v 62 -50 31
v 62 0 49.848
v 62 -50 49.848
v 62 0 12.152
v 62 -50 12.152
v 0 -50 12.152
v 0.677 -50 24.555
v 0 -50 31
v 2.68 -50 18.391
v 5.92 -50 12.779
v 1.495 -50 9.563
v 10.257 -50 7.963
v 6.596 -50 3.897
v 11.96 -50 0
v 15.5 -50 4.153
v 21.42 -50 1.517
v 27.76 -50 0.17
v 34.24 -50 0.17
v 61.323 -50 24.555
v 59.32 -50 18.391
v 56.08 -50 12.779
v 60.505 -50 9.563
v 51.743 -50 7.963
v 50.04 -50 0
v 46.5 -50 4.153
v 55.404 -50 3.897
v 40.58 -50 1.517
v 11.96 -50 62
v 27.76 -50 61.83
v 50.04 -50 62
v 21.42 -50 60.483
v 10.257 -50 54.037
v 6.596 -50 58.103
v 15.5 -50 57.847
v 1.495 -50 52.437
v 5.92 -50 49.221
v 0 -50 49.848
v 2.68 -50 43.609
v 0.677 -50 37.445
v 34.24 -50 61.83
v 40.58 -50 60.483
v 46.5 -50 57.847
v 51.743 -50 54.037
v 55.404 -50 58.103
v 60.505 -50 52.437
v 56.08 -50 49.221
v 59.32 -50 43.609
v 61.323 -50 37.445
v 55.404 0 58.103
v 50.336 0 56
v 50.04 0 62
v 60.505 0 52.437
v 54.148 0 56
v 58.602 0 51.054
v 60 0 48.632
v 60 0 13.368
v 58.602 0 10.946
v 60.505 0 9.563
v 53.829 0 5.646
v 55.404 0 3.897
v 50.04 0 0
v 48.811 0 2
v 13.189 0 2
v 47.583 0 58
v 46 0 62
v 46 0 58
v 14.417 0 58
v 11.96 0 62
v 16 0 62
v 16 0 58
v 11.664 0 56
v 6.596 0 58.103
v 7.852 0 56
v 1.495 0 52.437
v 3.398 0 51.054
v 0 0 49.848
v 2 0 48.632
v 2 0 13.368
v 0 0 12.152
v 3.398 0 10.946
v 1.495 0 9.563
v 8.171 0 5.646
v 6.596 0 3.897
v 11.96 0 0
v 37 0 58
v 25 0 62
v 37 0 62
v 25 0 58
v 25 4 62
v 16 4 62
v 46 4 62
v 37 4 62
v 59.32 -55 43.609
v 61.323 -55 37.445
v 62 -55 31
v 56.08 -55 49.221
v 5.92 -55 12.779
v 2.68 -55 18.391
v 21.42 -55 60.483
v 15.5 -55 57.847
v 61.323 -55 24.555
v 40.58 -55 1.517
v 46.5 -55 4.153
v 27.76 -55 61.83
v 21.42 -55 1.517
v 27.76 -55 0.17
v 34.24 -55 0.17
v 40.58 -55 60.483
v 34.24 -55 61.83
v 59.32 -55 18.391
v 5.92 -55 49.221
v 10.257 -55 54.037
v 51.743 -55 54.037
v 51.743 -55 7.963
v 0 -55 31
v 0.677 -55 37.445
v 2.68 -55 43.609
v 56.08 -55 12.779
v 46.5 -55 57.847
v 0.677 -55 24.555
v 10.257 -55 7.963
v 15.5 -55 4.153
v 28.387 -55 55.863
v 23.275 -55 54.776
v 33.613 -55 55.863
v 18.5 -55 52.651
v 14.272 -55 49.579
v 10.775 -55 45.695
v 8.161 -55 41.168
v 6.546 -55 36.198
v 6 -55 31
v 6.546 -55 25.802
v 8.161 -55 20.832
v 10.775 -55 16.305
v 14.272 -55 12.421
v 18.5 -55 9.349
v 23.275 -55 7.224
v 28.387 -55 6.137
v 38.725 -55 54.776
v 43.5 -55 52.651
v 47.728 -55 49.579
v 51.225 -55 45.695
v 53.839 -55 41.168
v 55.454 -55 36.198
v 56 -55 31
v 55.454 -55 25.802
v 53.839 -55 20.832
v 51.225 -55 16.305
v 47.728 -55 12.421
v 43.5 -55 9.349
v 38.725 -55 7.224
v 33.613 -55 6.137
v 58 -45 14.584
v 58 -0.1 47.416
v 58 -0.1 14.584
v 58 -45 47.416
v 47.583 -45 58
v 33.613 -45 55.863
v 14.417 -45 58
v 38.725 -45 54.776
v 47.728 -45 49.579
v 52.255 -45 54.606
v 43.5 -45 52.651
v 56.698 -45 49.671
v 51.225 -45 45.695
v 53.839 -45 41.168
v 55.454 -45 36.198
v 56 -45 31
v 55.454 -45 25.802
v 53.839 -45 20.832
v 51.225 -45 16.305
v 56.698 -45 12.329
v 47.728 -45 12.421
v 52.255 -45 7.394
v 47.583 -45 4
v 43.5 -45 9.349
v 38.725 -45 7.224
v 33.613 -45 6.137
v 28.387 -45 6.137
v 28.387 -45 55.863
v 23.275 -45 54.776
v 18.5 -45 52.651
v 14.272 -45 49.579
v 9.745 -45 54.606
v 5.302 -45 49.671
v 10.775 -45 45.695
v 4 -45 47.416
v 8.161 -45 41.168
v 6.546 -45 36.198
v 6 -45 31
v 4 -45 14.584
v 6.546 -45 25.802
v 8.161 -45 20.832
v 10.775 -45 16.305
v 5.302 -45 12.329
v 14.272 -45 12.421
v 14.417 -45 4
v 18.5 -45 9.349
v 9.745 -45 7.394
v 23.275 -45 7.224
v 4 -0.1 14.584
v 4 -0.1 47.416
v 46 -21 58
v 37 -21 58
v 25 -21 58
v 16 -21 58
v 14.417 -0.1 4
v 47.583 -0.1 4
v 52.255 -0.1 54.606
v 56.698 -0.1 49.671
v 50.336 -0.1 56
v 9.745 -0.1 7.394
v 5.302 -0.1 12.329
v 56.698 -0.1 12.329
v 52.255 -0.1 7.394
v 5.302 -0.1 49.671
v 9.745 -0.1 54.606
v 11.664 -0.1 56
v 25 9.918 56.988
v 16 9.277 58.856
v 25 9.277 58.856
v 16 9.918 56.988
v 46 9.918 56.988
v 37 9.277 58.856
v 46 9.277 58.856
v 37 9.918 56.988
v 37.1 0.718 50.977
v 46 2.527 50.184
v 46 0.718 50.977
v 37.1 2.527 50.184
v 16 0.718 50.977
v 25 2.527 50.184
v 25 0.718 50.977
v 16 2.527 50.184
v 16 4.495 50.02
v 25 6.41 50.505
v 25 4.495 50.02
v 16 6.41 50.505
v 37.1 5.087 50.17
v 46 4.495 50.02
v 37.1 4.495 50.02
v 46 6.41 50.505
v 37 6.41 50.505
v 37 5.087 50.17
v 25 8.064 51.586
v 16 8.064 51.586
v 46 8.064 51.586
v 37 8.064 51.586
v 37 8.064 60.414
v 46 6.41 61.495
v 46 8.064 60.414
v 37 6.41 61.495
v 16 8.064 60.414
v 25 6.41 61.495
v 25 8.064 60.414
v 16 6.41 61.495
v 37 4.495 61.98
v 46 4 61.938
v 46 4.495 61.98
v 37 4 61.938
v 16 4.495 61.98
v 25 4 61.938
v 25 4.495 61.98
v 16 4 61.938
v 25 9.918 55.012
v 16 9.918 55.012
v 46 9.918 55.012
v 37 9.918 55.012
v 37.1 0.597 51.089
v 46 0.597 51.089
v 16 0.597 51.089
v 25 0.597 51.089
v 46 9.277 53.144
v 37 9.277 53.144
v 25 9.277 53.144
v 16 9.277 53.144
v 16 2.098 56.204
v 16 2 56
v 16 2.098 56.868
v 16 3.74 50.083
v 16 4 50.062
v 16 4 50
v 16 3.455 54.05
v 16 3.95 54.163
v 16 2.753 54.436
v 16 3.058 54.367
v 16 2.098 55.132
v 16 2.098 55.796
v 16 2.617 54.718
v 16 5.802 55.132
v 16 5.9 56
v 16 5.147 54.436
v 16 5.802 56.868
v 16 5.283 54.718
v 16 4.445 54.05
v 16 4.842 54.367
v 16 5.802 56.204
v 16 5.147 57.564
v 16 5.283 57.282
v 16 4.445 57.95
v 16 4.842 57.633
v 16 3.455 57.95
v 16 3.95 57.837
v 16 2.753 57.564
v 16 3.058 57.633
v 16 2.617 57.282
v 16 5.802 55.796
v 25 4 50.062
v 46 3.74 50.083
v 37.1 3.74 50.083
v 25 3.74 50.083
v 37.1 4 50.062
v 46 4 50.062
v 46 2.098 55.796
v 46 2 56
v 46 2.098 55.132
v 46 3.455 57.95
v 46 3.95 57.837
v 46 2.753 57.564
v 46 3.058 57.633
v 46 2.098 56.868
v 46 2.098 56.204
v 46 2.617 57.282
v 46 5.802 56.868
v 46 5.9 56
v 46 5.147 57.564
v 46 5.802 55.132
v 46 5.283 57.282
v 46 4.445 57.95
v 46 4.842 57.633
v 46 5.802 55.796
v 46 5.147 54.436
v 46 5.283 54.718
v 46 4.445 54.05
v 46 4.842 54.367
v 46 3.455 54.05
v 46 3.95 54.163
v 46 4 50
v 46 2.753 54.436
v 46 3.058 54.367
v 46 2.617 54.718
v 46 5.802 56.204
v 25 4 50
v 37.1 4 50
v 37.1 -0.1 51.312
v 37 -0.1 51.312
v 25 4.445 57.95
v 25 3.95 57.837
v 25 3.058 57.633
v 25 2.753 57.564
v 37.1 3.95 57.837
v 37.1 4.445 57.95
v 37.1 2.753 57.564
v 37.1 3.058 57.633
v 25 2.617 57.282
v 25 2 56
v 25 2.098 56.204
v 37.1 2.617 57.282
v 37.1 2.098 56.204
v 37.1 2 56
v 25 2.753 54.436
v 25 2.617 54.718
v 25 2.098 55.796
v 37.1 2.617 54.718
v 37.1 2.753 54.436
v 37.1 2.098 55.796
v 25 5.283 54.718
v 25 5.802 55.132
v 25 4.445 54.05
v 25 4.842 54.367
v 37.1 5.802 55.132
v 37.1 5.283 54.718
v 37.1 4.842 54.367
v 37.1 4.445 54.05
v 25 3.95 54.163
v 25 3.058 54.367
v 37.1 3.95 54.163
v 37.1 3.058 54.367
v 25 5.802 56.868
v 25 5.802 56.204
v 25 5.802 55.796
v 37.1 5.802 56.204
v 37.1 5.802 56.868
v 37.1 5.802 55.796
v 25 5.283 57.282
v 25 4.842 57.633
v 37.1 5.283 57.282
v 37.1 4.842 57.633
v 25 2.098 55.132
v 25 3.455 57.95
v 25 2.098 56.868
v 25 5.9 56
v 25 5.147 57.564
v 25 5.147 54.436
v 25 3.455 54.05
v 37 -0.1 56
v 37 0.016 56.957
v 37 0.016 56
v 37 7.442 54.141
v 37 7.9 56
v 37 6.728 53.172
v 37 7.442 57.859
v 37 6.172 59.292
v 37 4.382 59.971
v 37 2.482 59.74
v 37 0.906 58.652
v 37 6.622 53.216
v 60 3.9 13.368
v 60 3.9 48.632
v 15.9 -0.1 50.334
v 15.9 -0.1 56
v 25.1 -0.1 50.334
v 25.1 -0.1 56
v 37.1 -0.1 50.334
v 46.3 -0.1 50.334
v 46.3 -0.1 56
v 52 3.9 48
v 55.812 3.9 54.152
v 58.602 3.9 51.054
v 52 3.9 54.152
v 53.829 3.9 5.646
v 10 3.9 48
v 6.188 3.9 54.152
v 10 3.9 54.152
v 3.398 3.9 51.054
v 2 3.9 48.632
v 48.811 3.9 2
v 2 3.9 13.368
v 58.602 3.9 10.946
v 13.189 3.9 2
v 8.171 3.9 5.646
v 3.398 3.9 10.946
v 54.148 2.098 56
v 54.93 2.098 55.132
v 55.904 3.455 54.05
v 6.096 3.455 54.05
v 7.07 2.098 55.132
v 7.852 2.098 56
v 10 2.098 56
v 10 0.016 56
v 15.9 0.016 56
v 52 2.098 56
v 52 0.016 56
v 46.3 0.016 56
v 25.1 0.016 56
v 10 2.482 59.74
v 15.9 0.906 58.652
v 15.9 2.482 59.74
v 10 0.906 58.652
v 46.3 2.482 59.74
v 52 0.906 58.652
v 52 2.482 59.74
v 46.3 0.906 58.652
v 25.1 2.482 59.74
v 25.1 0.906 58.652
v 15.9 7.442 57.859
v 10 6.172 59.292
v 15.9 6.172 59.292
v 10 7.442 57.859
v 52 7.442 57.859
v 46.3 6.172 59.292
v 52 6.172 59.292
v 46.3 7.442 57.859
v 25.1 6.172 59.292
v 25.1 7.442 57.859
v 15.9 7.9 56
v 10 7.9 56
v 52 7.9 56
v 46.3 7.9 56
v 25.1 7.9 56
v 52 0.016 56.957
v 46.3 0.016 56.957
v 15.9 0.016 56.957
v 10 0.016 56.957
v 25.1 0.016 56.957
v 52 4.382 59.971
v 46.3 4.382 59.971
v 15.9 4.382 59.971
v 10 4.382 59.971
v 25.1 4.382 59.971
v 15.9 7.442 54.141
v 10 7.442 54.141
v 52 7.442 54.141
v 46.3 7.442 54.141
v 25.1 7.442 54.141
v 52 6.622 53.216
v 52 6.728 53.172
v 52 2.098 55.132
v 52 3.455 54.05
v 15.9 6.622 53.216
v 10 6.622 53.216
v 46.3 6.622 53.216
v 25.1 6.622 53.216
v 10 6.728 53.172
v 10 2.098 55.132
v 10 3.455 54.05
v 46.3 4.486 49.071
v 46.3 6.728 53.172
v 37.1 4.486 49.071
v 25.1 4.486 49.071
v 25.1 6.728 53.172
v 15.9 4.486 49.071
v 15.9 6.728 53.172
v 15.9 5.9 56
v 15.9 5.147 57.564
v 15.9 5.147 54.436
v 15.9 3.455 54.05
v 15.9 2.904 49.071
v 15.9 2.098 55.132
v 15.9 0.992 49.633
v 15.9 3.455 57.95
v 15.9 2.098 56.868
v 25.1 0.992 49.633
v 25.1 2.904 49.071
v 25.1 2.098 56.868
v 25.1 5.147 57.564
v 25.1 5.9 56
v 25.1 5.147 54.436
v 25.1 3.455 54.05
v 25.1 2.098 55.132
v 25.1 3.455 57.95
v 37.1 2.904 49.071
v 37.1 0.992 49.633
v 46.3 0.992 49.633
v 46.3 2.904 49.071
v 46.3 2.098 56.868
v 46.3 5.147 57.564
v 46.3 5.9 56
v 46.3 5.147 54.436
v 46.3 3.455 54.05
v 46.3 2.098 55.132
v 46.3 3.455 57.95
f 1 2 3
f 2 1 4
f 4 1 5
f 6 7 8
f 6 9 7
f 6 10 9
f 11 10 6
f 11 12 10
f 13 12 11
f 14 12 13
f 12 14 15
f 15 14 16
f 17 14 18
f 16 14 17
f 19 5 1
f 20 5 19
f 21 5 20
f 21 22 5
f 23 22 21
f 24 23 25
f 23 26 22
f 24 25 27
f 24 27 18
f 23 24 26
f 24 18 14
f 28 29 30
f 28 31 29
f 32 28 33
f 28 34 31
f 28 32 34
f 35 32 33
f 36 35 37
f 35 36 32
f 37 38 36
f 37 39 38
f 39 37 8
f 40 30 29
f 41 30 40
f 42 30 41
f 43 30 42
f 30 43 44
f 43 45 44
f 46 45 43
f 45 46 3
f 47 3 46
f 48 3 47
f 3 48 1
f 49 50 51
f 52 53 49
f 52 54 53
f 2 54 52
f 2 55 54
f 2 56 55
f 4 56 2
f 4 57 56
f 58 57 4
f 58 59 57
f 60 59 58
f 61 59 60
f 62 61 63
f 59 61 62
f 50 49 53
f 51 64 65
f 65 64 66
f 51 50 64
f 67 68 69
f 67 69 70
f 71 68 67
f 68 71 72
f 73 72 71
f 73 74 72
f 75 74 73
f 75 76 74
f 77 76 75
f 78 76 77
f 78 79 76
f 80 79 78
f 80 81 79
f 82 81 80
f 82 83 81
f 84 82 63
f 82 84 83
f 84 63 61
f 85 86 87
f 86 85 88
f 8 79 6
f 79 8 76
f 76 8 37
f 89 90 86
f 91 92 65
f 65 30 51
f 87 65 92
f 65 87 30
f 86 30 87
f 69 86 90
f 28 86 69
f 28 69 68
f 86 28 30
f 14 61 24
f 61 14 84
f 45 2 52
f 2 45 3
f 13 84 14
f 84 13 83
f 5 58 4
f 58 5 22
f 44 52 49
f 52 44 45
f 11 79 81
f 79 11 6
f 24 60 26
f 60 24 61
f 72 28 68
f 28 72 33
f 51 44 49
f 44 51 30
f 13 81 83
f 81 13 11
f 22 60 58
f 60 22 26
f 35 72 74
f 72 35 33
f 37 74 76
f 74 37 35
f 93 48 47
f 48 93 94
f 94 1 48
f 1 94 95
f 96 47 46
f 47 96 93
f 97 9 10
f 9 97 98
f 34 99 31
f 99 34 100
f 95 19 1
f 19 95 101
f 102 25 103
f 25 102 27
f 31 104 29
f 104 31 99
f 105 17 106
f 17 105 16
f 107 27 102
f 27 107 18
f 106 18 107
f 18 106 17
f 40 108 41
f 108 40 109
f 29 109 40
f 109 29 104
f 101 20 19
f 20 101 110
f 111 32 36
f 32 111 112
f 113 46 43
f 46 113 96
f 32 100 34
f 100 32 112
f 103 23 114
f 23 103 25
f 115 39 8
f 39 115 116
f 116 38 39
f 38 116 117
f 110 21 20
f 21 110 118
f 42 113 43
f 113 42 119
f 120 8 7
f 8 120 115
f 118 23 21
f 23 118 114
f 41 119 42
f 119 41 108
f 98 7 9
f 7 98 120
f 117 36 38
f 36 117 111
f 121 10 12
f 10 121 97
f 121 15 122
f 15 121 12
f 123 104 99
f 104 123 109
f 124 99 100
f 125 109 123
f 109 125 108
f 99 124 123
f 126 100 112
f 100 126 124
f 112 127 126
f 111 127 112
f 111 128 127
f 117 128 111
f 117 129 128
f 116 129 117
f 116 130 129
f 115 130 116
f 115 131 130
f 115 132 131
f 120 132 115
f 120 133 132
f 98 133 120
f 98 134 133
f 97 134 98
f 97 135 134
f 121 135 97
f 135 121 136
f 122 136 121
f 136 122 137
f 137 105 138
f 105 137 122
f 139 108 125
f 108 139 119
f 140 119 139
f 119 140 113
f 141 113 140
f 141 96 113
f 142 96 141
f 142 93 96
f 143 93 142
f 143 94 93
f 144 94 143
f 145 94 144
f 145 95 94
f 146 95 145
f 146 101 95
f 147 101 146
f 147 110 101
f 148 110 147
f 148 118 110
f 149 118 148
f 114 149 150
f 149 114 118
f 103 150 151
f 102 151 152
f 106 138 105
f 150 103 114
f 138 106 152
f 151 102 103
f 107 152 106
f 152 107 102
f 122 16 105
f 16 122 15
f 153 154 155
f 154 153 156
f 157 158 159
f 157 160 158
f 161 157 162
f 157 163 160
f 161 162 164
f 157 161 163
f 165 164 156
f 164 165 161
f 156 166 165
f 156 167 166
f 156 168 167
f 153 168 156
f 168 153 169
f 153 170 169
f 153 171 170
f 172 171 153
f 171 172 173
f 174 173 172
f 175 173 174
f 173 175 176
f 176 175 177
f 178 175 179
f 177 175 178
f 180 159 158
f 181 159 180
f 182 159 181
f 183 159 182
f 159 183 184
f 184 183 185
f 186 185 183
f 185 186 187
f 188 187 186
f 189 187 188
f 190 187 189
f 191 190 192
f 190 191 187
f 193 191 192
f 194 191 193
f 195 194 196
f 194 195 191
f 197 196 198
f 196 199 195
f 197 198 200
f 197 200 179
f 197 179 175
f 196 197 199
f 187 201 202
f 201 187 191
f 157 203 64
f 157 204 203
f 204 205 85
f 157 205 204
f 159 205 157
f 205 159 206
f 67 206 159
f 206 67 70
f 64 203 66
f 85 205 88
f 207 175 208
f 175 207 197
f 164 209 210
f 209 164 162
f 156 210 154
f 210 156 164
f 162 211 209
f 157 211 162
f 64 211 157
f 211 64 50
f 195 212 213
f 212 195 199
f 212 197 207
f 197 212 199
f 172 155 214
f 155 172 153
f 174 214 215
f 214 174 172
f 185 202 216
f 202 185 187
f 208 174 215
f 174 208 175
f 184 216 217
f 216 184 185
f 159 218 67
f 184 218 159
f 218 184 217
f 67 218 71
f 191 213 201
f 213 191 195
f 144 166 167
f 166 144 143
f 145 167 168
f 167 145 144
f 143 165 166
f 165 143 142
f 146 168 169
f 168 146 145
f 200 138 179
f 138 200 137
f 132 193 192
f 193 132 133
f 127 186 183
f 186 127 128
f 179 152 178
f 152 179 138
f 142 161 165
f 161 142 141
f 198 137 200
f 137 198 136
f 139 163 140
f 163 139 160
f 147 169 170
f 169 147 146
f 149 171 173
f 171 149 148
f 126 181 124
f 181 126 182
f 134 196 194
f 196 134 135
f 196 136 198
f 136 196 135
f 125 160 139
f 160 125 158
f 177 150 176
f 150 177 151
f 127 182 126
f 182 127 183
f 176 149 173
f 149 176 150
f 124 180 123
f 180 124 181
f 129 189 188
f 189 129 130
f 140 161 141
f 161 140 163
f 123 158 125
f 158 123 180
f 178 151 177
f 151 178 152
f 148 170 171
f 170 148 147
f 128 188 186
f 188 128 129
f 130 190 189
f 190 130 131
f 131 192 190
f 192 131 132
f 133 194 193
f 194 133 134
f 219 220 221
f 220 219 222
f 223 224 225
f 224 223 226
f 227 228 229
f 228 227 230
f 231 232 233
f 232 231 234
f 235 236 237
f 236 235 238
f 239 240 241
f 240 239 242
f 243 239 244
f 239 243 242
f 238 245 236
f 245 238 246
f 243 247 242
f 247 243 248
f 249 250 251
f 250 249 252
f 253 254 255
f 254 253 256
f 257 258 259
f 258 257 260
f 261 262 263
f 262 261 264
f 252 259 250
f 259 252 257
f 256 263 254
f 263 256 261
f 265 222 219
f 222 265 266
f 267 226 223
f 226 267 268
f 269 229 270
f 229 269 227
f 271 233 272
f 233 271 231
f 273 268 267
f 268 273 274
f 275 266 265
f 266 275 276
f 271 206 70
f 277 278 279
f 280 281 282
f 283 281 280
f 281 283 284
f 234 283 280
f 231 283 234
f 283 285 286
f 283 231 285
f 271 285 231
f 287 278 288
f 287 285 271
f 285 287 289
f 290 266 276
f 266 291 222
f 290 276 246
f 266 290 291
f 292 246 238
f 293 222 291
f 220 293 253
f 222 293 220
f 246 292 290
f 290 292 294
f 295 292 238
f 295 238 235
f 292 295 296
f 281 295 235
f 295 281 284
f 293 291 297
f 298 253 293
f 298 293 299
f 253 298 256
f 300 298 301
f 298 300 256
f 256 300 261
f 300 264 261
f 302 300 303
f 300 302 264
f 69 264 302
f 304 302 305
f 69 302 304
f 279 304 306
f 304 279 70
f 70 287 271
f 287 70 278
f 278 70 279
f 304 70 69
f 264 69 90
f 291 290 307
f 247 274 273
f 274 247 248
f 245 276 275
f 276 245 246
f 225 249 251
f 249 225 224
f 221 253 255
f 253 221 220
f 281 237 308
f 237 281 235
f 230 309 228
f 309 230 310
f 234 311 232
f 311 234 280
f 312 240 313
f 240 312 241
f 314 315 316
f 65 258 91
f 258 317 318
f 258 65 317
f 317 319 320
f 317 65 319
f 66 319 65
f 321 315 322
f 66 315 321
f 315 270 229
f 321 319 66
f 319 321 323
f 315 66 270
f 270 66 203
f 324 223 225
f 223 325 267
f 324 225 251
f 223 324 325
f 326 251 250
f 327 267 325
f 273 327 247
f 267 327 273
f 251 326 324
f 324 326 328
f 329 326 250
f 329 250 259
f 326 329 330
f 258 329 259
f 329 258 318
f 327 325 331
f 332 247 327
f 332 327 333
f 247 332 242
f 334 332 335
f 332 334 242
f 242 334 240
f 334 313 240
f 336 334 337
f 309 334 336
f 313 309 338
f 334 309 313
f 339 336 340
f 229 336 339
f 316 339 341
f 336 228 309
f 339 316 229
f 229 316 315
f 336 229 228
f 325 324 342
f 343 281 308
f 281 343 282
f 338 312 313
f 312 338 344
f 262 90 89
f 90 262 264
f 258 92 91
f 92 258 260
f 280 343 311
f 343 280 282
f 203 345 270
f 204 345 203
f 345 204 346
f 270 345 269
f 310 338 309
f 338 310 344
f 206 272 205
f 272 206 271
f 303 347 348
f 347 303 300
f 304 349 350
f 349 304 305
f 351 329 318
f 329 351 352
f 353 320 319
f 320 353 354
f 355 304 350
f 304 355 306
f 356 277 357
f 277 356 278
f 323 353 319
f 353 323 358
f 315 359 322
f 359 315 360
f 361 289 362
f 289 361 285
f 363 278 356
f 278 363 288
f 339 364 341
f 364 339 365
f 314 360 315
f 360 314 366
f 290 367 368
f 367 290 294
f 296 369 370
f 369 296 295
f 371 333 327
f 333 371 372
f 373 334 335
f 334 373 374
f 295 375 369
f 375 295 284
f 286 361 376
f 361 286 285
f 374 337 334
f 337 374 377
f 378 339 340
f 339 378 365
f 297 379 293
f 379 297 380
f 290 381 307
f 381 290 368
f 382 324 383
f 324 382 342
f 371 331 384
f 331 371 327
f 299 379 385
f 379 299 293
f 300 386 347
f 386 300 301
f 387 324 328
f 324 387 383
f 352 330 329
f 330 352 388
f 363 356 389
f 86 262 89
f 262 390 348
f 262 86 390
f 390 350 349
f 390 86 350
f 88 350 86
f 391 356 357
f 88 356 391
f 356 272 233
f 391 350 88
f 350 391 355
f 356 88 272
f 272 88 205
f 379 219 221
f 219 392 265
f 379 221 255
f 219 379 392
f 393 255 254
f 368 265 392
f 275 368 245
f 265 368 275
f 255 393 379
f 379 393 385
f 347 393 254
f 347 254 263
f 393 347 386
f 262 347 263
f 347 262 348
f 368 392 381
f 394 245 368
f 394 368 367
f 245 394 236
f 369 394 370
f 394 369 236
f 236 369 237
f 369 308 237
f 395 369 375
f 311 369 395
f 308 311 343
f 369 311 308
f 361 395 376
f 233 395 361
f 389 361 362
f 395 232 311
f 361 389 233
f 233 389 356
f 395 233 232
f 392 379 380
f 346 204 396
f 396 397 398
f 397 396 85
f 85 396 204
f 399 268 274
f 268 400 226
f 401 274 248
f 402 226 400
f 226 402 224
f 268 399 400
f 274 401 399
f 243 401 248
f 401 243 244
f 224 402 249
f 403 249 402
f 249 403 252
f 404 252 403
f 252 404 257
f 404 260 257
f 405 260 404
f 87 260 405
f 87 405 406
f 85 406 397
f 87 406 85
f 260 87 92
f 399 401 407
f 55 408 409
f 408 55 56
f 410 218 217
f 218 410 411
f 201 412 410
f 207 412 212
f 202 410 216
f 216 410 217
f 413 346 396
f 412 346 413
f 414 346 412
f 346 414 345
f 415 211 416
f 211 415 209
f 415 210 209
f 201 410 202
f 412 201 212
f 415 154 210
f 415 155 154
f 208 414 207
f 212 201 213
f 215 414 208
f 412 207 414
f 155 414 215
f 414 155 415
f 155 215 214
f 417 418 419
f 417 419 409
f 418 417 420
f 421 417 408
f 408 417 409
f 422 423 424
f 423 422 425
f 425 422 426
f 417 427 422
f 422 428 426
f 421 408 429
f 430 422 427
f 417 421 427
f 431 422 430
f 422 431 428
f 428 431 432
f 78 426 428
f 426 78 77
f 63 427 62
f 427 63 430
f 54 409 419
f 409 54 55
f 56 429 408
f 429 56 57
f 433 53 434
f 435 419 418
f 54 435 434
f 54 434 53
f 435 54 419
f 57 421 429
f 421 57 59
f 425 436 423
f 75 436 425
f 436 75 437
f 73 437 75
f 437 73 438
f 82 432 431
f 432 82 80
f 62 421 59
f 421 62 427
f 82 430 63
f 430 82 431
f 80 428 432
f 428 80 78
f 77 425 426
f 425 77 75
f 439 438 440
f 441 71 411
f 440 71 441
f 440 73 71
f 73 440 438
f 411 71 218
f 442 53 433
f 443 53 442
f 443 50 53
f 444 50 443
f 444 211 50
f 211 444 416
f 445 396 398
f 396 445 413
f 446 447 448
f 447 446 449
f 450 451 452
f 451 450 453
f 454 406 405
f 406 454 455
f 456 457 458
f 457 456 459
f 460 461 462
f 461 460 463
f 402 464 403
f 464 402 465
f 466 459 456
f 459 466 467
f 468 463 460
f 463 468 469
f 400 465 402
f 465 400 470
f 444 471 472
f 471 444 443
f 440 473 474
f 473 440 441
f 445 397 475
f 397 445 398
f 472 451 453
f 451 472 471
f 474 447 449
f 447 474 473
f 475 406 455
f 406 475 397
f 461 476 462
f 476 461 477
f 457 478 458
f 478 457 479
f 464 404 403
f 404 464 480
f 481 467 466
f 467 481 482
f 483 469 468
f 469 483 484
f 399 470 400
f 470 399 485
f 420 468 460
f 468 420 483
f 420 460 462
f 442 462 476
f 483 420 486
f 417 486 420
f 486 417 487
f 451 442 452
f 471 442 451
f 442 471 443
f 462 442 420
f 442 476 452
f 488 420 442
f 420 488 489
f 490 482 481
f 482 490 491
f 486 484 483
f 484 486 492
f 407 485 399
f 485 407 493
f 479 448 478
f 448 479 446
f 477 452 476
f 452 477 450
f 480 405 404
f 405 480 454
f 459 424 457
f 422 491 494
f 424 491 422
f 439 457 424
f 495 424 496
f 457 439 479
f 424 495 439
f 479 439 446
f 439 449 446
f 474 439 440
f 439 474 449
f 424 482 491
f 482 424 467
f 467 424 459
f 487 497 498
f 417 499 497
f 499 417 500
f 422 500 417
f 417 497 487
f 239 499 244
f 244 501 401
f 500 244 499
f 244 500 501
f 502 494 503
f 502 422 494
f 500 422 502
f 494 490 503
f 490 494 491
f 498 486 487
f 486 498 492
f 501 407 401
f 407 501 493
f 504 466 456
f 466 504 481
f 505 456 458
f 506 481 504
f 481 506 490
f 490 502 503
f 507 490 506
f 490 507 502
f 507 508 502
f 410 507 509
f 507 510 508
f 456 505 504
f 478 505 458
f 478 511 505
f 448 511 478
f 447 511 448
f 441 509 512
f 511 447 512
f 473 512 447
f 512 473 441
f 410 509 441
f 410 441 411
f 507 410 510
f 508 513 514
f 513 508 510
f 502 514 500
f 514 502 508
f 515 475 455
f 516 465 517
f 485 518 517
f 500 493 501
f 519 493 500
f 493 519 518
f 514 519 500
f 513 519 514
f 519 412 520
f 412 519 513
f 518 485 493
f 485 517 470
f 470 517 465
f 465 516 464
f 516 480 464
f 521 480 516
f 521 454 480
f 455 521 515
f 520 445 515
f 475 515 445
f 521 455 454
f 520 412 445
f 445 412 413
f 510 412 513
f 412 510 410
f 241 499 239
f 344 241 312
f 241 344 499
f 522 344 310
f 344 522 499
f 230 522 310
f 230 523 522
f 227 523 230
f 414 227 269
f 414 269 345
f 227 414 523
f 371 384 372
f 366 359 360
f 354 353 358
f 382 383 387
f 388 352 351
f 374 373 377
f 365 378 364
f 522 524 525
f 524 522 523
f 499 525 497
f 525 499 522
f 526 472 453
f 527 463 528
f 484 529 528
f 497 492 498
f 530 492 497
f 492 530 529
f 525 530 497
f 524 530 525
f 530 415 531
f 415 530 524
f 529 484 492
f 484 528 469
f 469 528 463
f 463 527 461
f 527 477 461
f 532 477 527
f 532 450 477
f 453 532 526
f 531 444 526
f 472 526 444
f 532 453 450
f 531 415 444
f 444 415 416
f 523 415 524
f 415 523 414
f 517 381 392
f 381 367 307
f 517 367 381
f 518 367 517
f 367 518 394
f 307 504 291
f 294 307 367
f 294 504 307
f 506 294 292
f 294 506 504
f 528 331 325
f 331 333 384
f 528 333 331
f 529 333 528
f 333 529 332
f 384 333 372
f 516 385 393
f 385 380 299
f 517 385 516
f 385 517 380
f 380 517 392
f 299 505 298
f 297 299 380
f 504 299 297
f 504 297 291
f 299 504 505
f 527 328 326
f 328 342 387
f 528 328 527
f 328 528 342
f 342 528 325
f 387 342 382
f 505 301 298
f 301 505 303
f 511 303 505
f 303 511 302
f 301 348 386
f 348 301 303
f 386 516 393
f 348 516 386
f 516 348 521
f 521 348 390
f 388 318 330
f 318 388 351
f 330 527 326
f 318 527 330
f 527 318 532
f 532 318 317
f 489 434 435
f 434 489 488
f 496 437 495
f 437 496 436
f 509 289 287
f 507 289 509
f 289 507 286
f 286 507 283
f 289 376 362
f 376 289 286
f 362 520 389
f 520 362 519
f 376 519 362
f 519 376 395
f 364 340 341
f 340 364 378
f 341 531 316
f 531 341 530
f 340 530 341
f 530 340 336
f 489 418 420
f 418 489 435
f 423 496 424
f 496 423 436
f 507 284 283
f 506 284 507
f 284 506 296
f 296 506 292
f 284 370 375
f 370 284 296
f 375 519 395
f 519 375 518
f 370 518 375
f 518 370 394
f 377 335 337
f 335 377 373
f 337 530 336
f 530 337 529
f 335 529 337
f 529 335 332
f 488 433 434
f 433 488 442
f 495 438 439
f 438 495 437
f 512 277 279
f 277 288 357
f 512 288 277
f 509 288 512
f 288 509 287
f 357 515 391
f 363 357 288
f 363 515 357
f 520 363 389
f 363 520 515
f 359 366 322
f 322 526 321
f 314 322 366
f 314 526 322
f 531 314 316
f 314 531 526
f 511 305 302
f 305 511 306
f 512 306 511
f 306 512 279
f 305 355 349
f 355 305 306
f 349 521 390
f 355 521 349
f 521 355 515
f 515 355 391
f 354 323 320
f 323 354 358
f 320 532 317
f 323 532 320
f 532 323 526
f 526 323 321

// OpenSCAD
//
//  Copyright (C) 05-11-2012 Jasper den Ouden.
//
//  This is free software: you can redistribute it and/or modify
//  it under the terms of the GNU General Public License as published
//  by the Free Software Foundation, either version 3 of the License, or
//  (at your option) any later version.
//

plate_w = 4;
thread_d = 2;
thread_w = 5;

pot_r = 50/2;
top_w = 2*(pot_r + plate_w + thread_d);
Rf = 1.7;
top_R = top_w/Rf;
top_h  = 50;

hinge_d = 1.5*plate_w;
hinge_w = 1.5*hinge_d;

hinge_r = hinge_d/3;

space_d = plate_w/4;

module meh(r,w,h)
{ intersection()
    {   cube([w,w,h]);
        translate([w/2,w/2]) cylinder(r=r,h=h);
    }
}

module pot_top()
{ w = top_w;
  R = top_R;
  h = top_h;
  wi = w-2*plate_w;
  Ri = wi/Rf;
  difference()
  { union()
      { meh(R,w,h);
        translate([w/2,w/2,h]) 
            cylinder(r= pot_r + plate_w + thread_d, h=thread_w);
      }
    translate([plate_w,plate_w,-h]) meh(Ri,wi,2*h-thread_w);
    translate([w/2,w/2]) cylinder(r=pot_r, h=3*h);
        //TODO take out thread.
  }
}

module rcut(r,h)
{ difference()
    { cube([h,2*r,2*r]);
      rotate(a=90,v=[0,1,0]) cylinder(r=r, h = h);
    }
}

hinge_x = 4*plate_w;

module hinged_pot_hinge()
{ w = top_w;
  h = w-2*hinge_x;
  d = hinge_d;
  difference()
  { union()
      { cylinder(r=d,h=h);
        linear_extrude(height=h) 
            polygon([[0,-d], [0,d], [top_h/2,d], [top_h/2,d-plate_w]]);
      }
    translate([0,0,-top_h]) cylinder(r= hinge_r, h = 3*top_h);
    translate([-h,-h,hinge_w]) cube([3*h,3*h,h-2*hinge_w]);
  }  
}

module hinged_pot_top()
{ w = top_w;
  R = top_R;
  d= plate_w;
  difference()
  { pot_top();
//    translate([-w, w-4*d,-d]) cube([3*w, w,3*d]);
    
  }
  translate([w-2*hinge_x/2,w-hinge_d,-d]) rotate(v=[0,1,0], a=-90)
      hinged_pot_hinge();
}

rotate(v=[1,0,0],a=90) hinged_pot_top();

s=0.1;

module hinged_pot_lid()
{ w = top_w-plate_w;
    d = hinge_d;
    x = hinge_x-plate_w/2;
    translate([plate_w/2,0]) difference()
    { union()
        { translate([0,plate_w-w]) difference() 
            { meh(w/Rf, w, plate_w);
              translate([-w,w-d+plate_w/2,-plate_w]) 
                  cube([3*w, 2*d, 3*plate_w]);
            }
            translate([x-d,0]) 
                rotate(a=90, v=[0,1,0])
            { cylinder(r=plate_w, h=w-2*x+2*d);
              linear_extrude(height=w-2*x+2*d) 
                  polygon([[-plate_w,0], [plate_w,-plate_w]/sqrt(2),
                           [0,-2*plate_w]]);
            }
        }
        translate([x-s,0]) 
            rotate(a=90, v=[0,1,0]) cylinder(r=hinge_d+space_d, 
                                             h=hinge_w+2*s);
        translate([w-x-hinge_w+s,0]) 
            rotate(a=90, v=[0,1,0]) cylinder(r=hinge_d+space_d, 
                                             h=hinge_w+2*s);
        translate([plate_w/2+x-d-w,0]) 
            rotate(a=90, v=[0,1,0]) cylinder(r=hinge_r, h=4*w);
    }
}

module hinged_pot_axis()
{ w = top_w-plate_w;
  d = hinge_d;
  x = hinge_x-plate_w/2;
  translate([x-d+plate_w/2,0]) rotate(a=90,v=[0,1,0]) 
      cylinder(r=hinge_r, h=w-2*x+2*d); 
}

color([0,0,1]) translate([0,plate_w-s,top_w-hinge_d]) 
rotate(v=[1,0,0],a=90+90*$t) union()
{ hinged_pot_lid();
  color([1,0,0])hinged_pot_axis();
}
